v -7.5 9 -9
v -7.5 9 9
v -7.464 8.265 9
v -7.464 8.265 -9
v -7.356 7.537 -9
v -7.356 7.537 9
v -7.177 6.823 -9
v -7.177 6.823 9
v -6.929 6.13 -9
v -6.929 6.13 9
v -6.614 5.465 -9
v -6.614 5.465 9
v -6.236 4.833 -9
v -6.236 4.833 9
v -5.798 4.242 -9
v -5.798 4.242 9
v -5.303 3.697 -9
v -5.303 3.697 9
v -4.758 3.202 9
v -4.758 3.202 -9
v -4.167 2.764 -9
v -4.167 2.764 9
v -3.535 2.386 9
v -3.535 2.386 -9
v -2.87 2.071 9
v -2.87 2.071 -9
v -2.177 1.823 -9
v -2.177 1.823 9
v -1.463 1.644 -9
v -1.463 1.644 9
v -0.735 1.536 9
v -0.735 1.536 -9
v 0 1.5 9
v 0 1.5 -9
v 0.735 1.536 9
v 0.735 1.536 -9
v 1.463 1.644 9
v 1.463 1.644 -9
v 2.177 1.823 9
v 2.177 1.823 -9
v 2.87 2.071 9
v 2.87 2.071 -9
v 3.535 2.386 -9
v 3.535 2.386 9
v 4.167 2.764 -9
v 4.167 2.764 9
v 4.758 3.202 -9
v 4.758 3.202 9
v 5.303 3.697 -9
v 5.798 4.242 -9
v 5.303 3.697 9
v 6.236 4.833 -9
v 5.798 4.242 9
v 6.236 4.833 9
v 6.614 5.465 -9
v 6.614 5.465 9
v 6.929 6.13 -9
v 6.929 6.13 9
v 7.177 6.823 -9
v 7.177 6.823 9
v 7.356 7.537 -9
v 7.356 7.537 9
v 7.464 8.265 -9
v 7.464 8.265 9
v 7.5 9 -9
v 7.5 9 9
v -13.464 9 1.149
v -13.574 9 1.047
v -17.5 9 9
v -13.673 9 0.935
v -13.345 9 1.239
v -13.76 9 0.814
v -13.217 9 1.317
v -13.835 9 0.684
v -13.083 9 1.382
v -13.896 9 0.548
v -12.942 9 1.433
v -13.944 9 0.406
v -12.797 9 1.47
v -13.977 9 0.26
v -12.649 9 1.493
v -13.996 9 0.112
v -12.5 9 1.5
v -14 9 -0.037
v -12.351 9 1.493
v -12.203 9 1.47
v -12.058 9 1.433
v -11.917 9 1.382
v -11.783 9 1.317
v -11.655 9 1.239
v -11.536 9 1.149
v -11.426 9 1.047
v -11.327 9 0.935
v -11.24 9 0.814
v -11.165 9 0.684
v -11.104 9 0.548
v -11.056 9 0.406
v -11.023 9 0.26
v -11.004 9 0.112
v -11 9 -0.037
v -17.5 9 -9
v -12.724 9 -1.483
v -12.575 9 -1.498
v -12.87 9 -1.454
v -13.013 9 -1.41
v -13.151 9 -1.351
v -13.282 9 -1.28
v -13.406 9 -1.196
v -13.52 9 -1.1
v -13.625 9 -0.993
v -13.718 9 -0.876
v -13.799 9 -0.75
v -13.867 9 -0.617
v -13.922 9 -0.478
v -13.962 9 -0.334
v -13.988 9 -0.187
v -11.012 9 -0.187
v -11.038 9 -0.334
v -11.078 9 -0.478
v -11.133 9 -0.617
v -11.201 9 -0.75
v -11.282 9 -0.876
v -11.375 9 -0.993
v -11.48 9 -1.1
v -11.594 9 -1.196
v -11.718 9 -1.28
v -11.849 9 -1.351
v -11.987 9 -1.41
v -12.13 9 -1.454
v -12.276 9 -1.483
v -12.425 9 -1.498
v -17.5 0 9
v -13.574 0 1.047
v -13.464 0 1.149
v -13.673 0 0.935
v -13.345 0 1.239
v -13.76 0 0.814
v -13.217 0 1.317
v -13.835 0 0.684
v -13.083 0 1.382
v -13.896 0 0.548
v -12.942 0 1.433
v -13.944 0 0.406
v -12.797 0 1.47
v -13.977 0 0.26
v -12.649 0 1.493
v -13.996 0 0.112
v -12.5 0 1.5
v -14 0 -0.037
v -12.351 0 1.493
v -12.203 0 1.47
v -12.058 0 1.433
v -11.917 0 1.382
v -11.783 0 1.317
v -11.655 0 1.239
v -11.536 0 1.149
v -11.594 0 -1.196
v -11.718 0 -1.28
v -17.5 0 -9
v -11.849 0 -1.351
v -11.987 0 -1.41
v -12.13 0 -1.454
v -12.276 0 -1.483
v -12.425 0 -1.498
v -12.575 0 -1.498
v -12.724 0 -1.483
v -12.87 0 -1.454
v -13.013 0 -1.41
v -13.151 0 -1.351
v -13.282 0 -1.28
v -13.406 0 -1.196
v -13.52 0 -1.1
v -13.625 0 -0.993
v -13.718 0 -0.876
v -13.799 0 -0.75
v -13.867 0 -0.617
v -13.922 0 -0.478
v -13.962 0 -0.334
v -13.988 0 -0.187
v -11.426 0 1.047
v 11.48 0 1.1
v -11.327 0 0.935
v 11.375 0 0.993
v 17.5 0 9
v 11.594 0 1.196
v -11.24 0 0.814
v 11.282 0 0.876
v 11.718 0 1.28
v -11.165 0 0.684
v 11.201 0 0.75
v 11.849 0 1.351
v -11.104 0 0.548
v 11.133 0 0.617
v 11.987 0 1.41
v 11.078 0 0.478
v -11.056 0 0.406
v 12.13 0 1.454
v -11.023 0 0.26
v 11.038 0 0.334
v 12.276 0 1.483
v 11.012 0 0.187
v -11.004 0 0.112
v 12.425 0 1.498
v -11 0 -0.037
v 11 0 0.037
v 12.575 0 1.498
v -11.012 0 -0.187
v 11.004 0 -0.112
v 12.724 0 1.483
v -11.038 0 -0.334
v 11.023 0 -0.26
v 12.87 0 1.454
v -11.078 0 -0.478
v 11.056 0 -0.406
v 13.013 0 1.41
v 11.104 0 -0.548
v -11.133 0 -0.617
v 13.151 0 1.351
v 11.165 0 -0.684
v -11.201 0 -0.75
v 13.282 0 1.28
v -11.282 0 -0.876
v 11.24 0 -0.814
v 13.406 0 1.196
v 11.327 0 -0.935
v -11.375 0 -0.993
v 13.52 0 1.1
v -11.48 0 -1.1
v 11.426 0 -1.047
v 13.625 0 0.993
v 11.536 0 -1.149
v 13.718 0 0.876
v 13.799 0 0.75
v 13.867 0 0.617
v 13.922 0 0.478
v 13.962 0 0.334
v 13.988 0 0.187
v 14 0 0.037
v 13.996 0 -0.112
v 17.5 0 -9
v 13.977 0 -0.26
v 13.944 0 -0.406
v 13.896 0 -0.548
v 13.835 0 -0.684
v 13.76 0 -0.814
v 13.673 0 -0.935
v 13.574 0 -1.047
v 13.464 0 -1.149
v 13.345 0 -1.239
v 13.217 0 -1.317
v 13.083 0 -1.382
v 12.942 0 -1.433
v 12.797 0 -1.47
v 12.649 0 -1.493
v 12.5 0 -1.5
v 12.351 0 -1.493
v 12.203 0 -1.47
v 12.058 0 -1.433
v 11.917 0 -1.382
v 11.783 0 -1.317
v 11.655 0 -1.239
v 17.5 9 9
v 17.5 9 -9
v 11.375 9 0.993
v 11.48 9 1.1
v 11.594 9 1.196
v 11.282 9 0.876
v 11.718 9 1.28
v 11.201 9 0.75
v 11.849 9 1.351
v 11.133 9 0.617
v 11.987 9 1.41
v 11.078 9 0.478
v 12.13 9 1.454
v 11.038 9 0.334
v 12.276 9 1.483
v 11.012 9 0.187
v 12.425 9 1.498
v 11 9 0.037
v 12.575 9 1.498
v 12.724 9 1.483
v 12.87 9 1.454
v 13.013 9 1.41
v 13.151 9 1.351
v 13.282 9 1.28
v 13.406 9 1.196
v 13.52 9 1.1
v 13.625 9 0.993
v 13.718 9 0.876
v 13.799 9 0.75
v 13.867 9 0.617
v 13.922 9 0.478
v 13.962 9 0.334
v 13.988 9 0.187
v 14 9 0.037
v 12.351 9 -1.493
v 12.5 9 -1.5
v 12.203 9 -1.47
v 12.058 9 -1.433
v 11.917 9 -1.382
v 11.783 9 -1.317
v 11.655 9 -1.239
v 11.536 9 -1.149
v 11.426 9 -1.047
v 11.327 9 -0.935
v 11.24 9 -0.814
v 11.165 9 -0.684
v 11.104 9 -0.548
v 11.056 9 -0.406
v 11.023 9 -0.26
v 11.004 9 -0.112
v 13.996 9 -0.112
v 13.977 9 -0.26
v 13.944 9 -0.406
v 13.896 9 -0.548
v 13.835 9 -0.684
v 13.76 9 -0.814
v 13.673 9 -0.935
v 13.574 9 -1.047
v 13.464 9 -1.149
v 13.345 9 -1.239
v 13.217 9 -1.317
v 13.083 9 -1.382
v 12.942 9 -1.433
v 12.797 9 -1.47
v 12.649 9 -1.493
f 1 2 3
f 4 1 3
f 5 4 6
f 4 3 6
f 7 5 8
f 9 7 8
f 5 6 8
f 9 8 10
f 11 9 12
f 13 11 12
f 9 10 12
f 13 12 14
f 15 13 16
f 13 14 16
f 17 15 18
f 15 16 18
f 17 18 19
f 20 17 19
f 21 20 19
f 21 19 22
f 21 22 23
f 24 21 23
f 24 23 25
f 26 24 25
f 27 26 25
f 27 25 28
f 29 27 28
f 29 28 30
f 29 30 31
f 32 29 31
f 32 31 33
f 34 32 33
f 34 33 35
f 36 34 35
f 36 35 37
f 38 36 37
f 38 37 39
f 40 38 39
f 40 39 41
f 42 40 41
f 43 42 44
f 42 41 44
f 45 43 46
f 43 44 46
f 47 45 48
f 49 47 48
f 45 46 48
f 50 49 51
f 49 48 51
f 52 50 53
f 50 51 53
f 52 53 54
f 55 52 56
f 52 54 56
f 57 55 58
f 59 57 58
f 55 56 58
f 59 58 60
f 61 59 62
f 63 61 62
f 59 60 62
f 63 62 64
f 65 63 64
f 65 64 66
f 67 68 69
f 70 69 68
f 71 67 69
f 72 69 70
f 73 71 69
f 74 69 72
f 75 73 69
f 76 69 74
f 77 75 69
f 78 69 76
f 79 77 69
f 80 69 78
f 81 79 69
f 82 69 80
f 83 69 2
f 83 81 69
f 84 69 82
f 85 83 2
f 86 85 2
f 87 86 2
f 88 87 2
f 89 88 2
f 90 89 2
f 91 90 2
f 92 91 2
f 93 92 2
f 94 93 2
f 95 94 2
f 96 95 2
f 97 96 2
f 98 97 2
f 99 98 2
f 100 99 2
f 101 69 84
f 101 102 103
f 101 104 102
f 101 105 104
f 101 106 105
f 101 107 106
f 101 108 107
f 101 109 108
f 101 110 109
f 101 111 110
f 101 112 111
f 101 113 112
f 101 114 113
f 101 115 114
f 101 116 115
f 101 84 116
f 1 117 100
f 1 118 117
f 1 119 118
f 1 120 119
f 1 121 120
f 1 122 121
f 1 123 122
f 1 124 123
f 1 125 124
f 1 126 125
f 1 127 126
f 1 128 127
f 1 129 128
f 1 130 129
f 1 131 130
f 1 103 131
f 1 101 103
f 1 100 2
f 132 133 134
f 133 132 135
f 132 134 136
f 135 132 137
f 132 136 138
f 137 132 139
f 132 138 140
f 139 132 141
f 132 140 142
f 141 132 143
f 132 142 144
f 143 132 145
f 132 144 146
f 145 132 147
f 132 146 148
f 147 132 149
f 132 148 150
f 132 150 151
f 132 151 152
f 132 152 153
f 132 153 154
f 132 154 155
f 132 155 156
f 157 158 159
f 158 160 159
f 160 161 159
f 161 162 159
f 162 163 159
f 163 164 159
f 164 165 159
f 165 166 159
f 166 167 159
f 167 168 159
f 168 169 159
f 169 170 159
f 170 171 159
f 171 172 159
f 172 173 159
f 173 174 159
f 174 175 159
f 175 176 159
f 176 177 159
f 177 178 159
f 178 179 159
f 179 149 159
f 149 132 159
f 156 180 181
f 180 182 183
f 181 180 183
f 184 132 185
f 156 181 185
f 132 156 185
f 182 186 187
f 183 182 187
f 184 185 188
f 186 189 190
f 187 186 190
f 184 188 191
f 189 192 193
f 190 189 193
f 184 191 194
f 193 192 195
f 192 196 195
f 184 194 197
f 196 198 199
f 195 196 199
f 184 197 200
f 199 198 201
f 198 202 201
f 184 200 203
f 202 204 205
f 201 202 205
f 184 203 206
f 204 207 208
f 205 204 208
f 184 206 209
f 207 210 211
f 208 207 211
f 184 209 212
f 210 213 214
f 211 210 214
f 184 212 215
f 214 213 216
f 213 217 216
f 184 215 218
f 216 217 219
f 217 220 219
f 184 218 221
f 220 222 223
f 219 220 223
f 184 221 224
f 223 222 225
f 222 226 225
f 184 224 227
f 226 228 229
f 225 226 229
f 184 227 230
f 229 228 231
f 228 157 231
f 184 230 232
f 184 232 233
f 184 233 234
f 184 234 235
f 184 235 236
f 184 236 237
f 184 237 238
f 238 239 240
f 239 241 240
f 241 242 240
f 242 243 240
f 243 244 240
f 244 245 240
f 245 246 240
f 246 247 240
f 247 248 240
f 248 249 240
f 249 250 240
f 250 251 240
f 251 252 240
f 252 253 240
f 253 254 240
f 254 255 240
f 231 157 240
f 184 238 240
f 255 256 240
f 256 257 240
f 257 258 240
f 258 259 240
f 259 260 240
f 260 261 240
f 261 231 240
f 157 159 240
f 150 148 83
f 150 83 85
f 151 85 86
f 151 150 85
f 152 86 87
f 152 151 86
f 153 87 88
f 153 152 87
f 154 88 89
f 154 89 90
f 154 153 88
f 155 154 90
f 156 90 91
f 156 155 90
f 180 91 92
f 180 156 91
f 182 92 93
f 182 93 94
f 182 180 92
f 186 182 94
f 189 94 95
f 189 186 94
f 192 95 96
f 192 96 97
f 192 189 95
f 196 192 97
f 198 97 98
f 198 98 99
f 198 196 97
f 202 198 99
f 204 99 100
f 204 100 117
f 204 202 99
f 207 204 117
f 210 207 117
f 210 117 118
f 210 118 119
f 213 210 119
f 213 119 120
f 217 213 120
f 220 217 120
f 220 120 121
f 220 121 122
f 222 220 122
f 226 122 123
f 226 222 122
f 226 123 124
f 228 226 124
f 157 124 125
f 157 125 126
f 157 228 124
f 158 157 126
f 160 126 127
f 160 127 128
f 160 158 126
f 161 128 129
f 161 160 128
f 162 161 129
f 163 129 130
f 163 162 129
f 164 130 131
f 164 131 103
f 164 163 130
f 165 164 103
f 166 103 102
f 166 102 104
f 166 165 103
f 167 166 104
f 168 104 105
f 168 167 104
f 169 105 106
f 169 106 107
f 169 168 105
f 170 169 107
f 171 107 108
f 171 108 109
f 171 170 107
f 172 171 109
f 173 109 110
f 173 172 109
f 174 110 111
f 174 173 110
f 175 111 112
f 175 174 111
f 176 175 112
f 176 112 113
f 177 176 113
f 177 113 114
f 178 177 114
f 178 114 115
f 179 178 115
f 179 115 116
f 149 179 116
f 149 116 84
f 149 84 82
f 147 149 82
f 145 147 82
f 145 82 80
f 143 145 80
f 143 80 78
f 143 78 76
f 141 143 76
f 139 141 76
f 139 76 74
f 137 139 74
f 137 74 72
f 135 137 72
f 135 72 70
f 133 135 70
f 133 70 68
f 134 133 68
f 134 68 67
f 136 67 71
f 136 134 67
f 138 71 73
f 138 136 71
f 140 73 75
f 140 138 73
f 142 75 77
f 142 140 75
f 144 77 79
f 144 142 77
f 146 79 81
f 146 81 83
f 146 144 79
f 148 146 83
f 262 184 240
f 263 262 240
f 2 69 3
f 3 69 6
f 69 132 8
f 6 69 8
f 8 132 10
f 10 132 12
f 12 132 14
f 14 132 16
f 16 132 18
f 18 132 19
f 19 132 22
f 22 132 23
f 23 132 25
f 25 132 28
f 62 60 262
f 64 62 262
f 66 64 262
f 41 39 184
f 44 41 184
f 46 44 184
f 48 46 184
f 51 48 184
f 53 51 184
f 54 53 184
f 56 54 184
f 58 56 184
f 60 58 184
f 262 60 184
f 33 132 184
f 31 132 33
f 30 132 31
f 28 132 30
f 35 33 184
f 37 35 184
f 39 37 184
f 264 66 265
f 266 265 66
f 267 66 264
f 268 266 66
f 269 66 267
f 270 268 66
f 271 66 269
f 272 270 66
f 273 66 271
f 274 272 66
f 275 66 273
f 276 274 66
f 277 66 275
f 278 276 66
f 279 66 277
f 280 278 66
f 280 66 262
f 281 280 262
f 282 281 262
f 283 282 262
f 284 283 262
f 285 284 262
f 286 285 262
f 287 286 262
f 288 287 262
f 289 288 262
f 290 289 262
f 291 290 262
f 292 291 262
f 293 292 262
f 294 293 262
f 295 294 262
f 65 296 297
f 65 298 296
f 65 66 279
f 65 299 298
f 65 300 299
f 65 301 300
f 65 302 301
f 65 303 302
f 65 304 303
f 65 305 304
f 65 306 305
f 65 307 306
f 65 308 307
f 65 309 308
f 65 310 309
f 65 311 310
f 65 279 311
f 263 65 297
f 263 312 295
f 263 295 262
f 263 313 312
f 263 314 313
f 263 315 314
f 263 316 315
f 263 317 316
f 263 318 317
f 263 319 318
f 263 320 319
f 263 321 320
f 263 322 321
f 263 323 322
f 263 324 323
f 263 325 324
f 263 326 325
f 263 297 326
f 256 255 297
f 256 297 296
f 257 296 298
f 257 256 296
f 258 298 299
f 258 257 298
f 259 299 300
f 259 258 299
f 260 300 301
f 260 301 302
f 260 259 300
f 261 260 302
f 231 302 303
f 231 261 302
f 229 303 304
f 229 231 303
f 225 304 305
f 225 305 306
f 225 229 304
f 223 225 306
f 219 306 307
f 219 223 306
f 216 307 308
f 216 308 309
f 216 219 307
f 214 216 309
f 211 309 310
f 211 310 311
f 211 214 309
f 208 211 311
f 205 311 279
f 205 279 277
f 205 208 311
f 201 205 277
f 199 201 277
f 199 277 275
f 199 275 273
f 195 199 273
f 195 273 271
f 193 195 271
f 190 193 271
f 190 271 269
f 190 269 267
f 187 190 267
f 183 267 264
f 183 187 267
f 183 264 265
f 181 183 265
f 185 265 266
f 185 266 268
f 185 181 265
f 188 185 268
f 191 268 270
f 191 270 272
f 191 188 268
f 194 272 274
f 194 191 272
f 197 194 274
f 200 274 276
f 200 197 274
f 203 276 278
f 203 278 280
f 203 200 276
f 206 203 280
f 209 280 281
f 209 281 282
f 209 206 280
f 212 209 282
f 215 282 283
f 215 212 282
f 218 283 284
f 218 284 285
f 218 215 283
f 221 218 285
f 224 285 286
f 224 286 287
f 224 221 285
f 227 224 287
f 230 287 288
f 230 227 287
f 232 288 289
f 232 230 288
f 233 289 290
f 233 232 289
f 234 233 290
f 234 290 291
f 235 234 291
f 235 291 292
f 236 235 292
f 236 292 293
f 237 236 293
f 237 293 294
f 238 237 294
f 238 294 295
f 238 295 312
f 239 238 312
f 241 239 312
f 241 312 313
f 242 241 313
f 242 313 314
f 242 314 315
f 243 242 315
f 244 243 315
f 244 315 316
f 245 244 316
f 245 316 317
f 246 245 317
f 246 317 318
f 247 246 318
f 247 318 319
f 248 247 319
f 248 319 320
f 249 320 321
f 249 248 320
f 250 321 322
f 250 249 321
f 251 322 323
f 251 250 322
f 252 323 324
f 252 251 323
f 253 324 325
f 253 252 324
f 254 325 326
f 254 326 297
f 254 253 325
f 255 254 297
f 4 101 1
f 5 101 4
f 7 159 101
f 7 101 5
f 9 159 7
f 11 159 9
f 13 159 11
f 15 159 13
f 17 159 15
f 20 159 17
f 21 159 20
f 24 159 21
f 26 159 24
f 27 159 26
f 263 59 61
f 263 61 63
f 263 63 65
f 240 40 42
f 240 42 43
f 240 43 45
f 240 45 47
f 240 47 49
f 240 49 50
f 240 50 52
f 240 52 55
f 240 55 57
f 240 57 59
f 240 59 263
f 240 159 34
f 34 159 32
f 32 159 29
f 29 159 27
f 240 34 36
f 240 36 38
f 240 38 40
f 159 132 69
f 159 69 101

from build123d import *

# Parameters (mm, degrees)
SKETCH1_W           = 35
SKETCH1_H           = 18
SKETCH1_R           = 1.5
BOSS_EXTRUDE1_DEPTH = 9
CUT_EXTRUDE1_REACH  = 28.669
SKETCH2_R           = 7.5


with BuildPart() as part:
    # Sketch1 → Boss-Extrude1 (new body)
    with BuildSketch(Plane(origin=(0, 0, 0), x_dir=(1, 0, 0), z_dir=(0, 1, 0))):
        Rectangle(SKETCH1_W, SKETCH1_H)
        with Locations(Location((-12.5, 0, 0), (0, 0, 270))):
            Circle(SKETCH1_R, mode=Mode.SUBTRACT)
        with Locations(Location((12.5, 0, 0), (0, 0, 90))):
            Circle(SKETCH1_R, mode=Mode.SUBTRACT)
    extrude(amount=BOSS_EXTRUDE1_DEPTH)

    # Sketch2 → Cut-Extrude1 (cut, up to next)
    with BuildSketch(Plane.XY.offset(9), mode=Mode.PRIVATE) as cut_extrude1_sk1:
        with Locations((0, 9)):
            Circle(SKETCH2_R)
    cut_extrude1_tool1 = extrude(cut_extrude1_sk1.sketch, amount=-CUT_EXTRUDE1_REACH, mode=Mode.PRIVATE) & part.part
    add(cut_extrude1_tool1.solids().sort_by_distance((0, 9, 9))[0], mode=Mode.SUBTRACT)


solid = part.part
